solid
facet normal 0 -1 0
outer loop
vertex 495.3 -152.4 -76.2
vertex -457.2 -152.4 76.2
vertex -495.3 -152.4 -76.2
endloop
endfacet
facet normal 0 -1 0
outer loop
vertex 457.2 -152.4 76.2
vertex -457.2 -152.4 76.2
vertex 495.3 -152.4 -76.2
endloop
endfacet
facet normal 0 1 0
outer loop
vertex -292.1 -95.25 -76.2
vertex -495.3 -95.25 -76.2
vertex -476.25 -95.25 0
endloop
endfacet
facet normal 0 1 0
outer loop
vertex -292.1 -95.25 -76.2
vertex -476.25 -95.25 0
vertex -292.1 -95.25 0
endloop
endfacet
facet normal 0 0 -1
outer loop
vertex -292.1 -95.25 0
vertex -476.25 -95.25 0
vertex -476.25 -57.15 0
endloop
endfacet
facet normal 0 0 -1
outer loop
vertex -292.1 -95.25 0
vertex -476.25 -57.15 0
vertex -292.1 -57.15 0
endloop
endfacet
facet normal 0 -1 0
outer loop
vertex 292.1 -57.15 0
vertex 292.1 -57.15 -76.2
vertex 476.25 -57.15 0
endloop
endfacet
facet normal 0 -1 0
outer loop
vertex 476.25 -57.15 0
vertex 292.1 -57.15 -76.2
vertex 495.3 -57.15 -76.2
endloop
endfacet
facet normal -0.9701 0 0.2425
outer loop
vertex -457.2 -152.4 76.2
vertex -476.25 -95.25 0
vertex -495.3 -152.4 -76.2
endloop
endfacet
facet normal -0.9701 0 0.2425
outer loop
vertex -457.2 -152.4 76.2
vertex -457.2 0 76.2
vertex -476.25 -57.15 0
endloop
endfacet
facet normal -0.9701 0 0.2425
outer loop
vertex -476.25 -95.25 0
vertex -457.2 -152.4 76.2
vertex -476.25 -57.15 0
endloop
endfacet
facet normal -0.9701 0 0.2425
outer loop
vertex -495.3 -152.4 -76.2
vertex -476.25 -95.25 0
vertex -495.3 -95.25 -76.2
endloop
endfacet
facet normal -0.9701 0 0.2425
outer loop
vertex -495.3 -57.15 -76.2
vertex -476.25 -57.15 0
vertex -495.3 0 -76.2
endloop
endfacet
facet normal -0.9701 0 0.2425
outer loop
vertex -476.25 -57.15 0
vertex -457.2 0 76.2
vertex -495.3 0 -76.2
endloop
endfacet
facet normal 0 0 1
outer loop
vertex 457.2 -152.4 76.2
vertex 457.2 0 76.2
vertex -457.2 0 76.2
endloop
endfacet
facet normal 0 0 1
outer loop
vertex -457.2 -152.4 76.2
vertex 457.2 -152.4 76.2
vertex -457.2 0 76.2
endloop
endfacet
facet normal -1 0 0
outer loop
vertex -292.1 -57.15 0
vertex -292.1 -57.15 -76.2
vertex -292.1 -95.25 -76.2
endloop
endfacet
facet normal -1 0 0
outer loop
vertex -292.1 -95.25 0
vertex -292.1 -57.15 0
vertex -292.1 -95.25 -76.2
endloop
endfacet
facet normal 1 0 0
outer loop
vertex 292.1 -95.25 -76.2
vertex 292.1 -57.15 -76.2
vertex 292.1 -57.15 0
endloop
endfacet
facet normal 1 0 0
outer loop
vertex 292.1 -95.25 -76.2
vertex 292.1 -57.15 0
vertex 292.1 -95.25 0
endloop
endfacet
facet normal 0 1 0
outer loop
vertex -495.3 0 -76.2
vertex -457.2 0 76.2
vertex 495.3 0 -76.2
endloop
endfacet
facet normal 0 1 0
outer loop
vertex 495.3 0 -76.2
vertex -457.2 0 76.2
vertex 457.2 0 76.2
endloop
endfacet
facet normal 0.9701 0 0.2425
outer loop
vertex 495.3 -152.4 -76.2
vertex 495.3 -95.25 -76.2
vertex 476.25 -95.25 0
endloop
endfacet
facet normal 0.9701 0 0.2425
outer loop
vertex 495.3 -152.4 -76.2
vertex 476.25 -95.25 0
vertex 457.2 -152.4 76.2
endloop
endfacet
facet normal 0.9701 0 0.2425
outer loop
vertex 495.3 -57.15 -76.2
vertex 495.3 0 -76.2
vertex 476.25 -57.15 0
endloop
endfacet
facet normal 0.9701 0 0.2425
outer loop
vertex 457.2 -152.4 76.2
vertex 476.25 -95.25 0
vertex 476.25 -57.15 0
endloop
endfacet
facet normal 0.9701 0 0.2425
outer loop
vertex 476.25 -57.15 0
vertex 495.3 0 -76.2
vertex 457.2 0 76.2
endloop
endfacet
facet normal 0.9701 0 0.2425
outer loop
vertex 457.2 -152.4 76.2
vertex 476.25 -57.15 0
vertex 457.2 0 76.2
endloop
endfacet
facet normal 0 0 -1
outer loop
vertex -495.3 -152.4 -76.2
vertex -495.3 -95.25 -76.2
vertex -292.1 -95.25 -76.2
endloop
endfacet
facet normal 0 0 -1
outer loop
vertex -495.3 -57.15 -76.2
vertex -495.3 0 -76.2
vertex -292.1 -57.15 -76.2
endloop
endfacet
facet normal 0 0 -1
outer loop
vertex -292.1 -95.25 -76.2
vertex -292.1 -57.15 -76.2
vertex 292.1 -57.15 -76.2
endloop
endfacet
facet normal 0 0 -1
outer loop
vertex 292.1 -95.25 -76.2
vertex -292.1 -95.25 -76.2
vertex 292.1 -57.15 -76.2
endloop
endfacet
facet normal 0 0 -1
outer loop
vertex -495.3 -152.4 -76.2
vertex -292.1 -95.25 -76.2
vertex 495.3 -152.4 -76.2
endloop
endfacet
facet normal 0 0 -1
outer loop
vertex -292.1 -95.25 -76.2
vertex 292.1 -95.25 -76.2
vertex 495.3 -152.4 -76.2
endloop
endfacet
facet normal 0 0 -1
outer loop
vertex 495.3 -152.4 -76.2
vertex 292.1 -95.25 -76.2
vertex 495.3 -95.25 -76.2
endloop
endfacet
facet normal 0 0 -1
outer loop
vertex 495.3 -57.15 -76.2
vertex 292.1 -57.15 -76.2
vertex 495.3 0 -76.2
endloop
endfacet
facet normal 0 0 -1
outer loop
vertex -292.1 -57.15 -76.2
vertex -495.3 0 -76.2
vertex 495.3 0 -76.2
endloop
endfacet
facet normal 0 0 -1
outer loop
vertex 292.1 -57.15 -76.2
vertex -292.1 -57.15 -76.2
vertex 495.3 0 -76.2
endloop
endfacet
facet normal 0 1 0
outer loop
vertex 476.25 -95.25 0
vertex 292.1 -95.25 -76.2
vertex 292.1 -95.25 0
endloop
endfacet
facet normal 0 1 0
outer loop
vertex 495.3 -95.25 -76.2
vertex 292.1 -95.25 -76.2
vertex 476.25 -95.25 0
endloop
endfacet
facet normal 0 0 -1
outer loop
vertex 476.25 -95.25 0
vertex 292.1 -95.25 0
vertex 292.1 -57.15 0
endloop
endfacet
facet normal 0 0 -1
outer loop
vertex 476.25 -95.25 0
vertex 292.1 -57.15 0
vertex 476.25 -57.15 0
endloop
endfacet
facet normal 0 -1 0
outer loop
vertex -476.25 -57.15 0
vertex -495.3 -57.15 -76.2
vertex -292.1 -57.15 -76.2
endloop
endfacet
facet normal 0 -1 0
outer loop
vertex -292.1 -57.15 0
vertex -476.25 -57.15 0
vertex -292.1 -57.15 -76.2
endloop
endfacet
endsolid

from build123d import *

# Parameters (mm, degrees)
F1_DEPTH = 152.4
F2_W     = 203.2
F2_H     = 38.1
F3_DEPTH = 76.2


with BuildPart() as f1:
    # F0 (on Front) → F1 (new body)
    with BuildSketch(Plane.XZ):
        Polygon((457.2, 76.2), (-457.2, 76.2), (-495.3, -76.2), (495.3, -76.2), align=None)
    extrude(amount=F1_DEPTH)

    # F2 (on face) → F3 (cut)
    with BuildSketch(Plane(origin=(0, 0, -76.2), x_dir=(1, 0, 0), z_dir=(0, 0, -1))):
        with Locations((-393.7, 76.2)):
            Rectangle(F2_W, F2_H)
        with Locations((393.7, 76.2)):
            Rectangle(F2_W, F2_H)
    extrude(amount=-F3_DEPTH, mode=Mode.SUBTRACT)


solid = f1.part
